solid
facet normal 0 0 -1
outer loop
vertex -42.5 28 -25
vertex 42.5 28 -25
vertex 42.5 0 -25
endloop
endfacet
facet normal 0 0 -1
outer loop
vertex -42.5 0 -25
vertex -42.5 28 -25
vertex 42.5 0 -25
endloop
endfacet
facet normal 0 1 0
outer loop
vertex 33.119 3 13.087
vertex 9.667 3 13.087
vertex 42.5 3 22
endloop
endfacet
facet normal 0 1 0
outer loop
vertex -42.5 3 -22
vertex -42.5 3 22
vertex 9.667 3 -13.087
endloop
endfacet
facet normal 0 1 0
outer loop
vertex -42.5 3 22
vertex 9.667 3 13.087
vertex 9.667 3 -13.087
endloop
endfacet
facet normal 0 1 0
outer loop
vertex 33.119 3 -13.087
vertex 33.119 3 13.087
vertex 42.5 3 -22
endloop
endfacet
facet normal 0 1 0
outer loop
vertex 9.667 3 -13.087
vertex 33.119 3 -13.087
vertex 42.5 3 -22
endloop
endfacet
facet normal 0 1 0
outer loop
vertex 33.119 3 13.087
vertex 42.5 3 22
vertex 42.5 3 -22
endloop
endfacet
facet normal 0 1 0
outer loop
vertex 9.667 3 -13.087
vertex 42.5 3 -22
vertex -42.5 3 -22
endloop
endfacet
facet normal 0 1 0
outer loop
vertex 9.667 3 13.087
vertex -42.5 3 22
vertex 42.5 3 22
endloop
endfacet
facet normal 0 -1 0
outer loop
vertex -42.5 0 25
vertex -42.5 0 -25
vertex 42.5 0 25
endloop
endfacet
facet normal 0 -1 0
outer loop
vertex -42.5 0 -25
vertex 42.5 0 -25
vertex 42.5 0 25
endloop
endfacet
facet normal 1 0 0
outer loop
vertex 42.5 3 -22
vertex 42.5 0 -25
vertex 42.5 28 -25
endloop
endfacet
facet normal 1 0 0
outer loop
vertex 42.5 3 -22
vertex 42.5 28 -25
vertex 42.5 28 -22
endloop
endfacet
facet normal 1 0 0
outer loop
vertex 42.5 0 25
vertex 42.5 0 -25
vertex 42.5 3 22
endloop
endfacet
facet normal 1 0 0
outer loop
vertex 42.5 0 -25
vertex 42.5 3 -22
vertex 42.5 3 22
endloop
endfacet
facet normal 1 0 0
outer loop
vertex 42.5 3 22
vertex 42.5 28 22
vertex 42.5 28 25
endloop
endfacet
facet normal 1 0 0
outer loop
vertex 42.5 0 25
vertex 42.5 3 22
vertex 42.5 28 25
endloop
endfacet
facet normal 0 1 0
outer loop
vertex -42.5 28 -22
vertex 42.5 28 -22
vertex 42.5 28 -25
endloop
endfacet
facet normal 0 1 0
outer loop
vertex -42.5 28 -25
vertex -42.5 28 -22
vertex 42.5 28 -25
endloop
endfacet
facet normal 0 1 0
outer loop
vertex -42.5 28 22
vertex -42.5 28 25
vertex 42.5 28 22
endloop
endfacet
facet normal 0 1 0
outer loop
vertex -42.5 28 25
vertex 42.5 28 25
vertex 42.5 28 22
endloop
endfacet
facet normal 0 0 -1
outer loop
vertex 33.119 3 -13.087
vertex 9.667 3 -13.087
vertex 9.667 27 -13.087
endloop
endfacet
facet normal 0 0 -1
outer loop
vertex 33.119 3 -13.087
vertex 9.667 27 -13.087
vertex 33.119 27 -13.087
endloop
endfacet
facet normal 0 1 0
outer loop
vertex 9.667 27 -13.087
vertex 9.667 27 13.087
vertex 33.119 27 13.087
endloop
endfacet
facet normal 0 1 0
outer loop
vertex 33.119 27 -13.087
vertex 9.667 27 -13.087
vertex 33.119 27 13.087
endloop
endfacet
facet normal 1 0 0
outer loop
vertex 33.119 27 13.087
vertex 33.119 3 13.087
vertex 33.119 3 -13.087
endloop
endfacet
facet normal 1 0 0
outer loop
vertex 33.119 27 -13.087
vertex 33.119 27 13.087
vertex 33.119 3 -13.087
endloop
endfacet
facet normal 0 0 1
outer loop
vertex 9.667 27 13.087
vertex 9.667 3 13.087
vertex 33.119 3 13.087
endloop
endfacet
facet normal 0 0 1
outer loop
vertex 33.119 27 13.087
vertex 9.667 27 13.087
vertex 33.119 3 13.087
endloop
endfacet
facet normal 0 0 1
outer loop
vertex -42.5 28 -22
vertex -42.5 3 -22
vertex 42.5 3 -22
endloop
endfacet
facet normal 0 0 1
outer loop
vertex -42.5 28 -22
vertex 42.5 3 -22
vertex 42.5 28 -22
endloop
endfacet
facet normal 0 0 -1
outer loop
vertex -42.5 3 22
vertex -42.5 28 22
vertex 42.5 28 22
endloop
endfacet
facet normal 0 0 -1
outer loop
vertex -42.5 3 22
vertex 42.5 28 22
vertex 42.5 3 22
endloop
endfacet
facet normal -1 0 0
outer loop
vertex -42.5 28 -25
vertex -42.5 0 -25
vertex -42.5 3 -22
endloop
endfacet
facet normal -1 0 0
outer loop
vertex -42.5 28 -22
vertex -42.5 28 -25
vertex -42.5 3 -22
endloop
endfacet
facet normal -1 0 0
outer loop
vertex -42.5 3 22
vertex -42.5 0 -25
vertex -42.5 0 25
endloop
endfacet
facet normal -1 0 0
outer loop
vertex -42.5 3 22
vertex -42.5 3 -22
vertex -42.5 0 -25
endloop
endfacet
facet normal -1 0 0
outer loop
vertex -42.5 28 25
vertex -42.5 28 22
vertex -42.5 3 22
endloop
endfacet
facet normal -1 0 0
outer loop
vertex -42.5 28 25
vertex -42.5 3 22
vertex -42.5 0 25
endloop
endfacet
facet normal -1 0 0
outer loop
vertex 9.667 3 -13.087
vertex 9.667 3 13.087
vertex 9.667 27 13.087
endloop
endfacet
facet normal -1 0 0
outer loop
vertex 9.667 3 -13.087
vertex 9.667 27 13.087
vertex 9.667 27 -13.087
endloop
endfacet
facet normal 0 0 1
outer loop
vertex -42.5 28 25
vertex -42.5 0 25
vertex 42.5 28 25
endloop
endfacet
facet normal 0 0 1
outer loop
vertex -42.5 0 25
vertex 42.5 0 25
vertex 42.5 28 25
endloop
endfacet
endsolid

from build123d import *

# Parameters (mm, degrees)
EXTRUDE_1_DEPTH   = 42.5
SKETCH_2_W        = 23.452329067
SKETCH_2_H        = 26.173759744
EXTRUDE_1_2_DEPTH = 24


with BuildPart() as part:
    # 草图1 → Extrude 1 (new, symmetric)
    with BuildSketch(Plane(origin=(0, 0, 0), x_dir=(0, 0, -1), z_dir=(1, 0, 0))):
        Polygon((25, 28), (25, 0), (-25, 0), (-25, 28), (-22, 28), (-22, 3), (22, 3), (22, 28), align=None)
    extrude(amount=EXTRUDE_1_DEPTH, both=True)

    # 草图2 → Extrude 1 2 (add)
    with BuildSketch(Plane(origin=(0, 3, 0), x_dir=(1, 0, 0), z_dir=(0, 1, 0))):
        with Locations((21.393325716, 0)):
            Rectangle(SKETCH_2_W, SKETCH_2_H)
    extrude(amount=EXTRUDE_1_2_DEPTH)


solid = part.part
